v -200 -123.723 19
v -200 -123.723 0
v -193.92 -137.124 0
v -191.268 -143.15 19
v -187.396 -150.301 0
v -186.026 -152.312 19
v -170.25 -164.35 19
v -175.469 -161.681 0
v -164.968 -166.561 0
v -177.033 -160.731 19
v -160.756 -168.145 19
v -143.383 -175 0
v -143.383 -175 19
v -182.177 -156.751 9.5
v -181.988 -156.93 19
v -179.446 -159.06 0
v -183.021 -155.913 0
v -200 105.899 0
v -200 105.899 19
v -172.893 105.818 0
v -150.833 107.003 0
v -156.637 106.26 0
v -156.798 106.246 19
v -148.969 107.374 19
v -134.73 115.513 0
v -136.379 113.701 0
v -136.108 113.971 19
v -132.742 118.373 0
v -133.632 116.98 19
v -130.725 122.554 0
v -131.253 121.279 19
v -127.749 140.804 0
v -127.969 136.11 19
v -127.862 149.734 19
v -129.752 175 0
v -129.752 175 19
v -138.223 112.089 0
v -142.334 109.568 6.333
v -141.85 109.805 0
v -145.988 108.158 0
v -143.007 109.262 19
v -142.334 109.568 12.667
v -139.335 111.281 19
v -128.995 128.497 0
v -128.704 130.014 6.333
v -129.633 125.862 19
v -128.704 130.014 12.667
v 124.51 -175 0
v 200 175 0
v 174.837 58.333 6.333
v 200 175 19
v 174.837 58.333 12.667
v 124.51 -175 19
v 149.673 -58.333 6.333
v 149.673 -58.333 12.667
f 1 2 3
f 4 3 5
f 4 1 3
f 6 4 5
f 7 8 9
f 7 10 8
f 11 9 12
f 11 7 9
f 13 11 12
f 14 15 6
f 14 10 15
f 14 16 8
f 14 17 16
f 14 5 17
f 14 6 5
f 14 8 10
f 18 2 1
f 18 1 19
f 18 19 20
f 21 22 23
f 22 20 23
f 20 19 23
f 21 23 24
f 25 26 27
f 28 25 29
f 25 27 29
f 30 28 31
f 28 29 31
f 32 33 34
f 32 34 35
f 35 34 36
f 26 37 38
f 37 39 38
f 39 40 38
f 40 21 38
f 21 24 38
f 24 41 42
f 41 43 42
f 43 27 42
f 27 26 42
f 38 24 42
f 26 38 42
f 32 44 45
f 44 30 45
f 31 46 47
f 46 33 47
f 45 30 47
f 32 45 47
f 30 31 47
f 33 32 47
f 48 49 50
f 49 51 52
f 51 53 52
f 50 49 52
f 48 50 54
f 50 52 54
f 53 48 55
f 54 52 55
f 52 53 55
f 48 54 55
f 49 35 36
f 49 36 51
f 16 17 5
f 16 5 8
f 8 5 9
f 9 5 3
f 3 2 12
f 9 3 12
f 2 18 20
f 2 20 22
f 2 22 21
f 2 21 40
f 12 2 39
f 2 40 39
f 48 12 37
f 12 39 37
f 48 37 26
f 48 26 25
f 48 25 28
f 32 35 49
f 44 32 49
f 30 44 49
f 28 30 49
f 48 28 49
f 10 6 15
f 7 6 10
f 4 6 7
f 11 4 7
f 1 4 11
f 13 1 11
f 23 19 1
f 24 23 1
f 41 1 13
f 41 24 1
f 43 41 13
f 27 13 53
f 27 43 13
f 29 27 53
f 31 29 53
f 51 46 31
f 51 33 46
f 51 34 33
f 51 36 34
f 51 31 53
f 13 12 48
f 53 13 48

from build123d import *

# Parameters (mm, degrees)
F0_W     = 400
F0_H     = 350
F1_DEPTH = 19
F3_DEPTH = 19.001
F5_DEPTH = 19.0010001
F7_DEPTH = 19.0010001


with BuildPart() as f1:
    # F0 (on Top) → F1 (new body)
    with BuildSketch(Plane.XY):
        Rectangle(F0_W, F0_H)
    extrude(amount=F1_DEPTH)

    # F2 (on face) → F3 (cut, through all)
    with BuildSketch(Plane.XY.offset(19)):
        with BuildLine():
            Line((-200, 175), (-200, 105.8987081051))
            add(Edge.make_bspline(
                [(-200, 105.8987081051), (-173.8925740945, 106.431558986), (-141.1865267667, 102.3876044201), (-124.6543102784, 129.8187881504), (-128.7484537478, 161.3148090825), (-129.7521442175, 175)],
                knots=[0, 0, 0, 0, 0.3945413032, 0.6518304565, 1, 1, 1, 1], degree=3))
            Line((-129.7521442175, 175), (-200, 175))
        make_face()
    extrude(amount=-F3_DEPTH, mode=Mode.SUBTRACT)

    # F4 (on face) → F5 (cut, through all)
    with BuildSketch(Plane.XY.offset(19)):
        with BuildLine():
            add(Edge.make_bspline(
                [(200, 175), (200, 58.3333333333), (200, -58.3333333333), (200, -175)],
                knots=[0, 0, 0, 0, 350, 350, 350, 350], degree=3))
            add(Edge.make_bspline(
                [(200, 175), (174.8365417123, 58.3333333333), (149.6730834246, -58.3333333333), (124.5096251369, -175)],
                knots=[0, 0, 0, 0, 358.0485954406, 358.0485954406, 358.0485954406, 358.0485954406], degree=3))
            add(Edge.make_bspline(
                [(200, -175), (174.8365417123, -175), (149.6730834246, -175), (124.5096251369, -175)],
                knots=[0, 0, 0, 0, 75.4903748631, 75.4903748631, 75.4903748631, 75.4903748631], degree=3))
        make_face()
    extrude(amount=-F5_DEPTH, mode=Mode.SUBTRACT)

    # F6 (on face) → F7 (cut, through all)
    with BuildSketch(Plane.XY.offset(19)):
        with BuildLine():
            add(Edge.make_bspline(
                [(-200, -123.7232536077), (-194.1574839929, -134.3379844624), (-187.7674284308, -163.1785715705), (-156.5418592203, -168.6152111018), (-143.3826684952, -175)],
                knots=[0, 0, 0, 0, 0.4833695599, 1, 1, 1, 1], degree=3))
            Line((-200, -123.7232536077), (-200, -175))
            Line((-200, -175), (-143.3826684952, -175))
        make_face()
    extrude(amount=-F7_DEPTH, mode=Mode.SUBTRACT)


solid = f1.part
